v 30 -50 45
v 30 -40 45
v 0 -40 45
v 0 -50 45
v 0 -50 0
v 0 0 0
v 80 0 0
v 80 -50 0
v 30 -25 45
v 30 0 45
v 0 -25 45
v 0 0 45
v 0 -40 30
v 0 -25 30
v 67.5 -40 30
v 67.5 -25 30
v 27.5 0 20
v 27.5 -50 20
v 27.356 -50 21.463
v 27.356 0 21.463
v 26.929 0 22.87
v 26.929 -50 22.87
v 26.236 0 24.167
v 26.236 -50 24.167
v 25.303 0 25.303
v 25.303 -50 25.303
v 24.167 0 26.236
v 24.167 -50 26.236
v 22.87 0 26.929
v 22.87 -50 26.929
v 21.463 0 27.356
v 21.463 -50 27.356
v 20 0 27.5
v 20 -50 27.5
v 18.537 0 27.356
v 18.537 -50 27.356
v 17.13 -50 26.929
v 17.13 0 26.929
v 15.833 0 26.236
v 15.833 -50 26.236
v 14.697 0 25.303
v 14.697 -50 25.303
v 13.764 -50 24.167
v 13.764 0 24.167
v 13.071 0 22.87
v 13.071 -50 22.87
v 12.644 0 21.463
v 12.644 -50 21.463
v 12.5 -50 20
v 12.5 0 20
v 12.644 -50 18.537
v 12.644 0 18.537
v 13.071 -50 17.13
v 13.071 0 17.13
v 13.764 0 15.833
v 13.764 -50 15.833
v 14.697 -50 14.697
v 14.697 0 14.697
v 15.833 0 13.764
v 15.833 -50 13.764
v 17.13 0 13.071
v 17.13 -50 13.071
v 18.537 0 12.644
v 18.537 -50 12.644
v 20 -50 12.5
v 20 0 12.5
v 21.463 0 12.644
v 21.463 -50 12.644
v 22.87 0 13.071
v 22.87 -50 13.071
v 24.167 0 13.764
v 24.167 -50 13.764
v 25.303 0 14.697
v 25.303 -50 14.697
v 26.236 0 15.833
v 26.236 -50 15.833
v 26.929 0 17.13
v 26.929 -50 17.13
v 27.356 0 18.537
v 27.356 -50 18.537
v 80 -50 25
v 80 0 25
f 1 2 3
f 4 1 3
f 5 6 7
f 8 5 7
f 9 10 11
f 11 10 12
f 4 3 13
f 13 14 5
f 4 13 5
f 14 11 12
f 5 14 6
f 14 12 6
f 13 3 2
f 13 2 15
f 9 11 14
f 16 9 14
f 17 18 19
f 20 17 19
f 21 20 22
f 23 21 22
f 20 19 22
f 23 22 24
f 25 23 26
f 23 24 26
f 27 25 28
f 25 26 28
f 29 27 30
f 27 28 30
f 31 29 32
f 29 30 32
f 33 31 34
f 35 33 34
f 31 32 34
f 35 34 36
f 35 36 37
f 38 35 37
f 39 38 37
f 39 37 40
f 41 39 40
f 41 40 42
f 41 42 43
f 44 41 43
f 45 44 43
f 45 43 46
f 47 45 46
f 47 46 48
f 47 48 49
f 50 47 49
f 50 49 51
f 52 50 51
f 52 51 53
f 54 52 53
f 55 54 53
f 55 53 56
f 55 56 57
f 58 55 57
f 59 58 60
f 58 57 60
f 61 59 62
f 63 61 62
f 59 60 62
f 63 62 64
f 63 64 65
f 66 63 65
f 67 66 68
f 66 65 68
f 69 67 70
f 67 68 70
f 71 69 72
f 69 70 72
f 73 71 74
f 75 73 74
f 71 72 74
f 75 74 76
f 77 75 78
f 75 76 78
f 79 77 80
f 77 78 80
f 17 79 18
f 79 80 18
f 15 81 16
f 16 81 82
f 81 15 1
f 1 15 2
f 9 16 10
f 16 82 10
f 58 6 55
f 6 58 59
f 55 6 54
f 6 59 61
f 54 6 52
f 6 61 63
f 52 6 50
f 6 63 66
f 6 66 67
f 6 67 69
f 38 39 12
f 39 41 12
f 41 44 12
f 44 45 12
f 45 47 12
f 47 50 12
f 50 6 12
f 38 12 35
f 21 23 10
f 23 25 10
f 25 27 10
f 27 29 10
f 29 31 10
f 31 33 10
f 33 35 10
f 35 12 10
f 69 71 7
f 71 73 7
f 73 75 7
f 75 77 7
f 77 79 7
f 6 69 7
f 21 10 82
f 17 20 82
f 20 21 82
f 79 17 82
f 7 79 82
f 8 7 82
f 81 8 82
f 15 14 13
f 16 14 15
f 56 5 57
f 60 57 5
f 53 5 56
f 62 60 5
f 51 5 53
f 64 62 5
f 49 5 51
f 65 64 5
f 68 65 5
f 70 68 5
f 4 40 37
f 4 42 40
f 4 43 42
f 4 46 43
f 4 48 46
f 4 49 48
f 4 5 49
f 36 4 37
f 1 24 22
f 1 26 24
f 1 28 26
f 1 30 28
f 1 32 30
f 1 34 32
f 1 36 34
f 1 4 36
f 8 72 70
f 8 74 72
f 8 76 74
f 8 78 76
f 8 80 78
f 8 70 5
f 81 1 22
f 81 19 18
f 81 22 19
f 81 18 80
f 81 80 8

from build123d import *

# Parameters (mm, degrees)
F1_DEPTH = 50
F2_R     = 7.5
F3_DEPTH = 50.001
F5_W     = 80
F5_H     = 15
F6_DEPTH = 15


with BuildPart() as f1:
    # F0 (on Front) → F1 (new body)
    with BuildSketch(Plane.XZ):
        Polygon((0, 45), (0, 0), (80, 0), (80, 25), (30, 45), align=None)
    extrude(amount=F1_DEPTH)

    # F2 (on face) → F3 (cut, through all)
    with BuildSketch(Plane.XZ.offset(50)):
        with Locations((20, 20)):
            Circle(F2_R)
    extrude(amount=-F3_DEPTH, mode=Mode.SUBTRACT)

    # F5 (on face) → F6 (cut, through all)
    with BuildSketch(Plane.XY.offset(45)):
        with Locations((40, -32.5)):
            Rectangle(F5_W, F5_H)
    extrude(amount=-F6_DEPTH, mode=Mode.SUBTRACT)


solid = f1.part
